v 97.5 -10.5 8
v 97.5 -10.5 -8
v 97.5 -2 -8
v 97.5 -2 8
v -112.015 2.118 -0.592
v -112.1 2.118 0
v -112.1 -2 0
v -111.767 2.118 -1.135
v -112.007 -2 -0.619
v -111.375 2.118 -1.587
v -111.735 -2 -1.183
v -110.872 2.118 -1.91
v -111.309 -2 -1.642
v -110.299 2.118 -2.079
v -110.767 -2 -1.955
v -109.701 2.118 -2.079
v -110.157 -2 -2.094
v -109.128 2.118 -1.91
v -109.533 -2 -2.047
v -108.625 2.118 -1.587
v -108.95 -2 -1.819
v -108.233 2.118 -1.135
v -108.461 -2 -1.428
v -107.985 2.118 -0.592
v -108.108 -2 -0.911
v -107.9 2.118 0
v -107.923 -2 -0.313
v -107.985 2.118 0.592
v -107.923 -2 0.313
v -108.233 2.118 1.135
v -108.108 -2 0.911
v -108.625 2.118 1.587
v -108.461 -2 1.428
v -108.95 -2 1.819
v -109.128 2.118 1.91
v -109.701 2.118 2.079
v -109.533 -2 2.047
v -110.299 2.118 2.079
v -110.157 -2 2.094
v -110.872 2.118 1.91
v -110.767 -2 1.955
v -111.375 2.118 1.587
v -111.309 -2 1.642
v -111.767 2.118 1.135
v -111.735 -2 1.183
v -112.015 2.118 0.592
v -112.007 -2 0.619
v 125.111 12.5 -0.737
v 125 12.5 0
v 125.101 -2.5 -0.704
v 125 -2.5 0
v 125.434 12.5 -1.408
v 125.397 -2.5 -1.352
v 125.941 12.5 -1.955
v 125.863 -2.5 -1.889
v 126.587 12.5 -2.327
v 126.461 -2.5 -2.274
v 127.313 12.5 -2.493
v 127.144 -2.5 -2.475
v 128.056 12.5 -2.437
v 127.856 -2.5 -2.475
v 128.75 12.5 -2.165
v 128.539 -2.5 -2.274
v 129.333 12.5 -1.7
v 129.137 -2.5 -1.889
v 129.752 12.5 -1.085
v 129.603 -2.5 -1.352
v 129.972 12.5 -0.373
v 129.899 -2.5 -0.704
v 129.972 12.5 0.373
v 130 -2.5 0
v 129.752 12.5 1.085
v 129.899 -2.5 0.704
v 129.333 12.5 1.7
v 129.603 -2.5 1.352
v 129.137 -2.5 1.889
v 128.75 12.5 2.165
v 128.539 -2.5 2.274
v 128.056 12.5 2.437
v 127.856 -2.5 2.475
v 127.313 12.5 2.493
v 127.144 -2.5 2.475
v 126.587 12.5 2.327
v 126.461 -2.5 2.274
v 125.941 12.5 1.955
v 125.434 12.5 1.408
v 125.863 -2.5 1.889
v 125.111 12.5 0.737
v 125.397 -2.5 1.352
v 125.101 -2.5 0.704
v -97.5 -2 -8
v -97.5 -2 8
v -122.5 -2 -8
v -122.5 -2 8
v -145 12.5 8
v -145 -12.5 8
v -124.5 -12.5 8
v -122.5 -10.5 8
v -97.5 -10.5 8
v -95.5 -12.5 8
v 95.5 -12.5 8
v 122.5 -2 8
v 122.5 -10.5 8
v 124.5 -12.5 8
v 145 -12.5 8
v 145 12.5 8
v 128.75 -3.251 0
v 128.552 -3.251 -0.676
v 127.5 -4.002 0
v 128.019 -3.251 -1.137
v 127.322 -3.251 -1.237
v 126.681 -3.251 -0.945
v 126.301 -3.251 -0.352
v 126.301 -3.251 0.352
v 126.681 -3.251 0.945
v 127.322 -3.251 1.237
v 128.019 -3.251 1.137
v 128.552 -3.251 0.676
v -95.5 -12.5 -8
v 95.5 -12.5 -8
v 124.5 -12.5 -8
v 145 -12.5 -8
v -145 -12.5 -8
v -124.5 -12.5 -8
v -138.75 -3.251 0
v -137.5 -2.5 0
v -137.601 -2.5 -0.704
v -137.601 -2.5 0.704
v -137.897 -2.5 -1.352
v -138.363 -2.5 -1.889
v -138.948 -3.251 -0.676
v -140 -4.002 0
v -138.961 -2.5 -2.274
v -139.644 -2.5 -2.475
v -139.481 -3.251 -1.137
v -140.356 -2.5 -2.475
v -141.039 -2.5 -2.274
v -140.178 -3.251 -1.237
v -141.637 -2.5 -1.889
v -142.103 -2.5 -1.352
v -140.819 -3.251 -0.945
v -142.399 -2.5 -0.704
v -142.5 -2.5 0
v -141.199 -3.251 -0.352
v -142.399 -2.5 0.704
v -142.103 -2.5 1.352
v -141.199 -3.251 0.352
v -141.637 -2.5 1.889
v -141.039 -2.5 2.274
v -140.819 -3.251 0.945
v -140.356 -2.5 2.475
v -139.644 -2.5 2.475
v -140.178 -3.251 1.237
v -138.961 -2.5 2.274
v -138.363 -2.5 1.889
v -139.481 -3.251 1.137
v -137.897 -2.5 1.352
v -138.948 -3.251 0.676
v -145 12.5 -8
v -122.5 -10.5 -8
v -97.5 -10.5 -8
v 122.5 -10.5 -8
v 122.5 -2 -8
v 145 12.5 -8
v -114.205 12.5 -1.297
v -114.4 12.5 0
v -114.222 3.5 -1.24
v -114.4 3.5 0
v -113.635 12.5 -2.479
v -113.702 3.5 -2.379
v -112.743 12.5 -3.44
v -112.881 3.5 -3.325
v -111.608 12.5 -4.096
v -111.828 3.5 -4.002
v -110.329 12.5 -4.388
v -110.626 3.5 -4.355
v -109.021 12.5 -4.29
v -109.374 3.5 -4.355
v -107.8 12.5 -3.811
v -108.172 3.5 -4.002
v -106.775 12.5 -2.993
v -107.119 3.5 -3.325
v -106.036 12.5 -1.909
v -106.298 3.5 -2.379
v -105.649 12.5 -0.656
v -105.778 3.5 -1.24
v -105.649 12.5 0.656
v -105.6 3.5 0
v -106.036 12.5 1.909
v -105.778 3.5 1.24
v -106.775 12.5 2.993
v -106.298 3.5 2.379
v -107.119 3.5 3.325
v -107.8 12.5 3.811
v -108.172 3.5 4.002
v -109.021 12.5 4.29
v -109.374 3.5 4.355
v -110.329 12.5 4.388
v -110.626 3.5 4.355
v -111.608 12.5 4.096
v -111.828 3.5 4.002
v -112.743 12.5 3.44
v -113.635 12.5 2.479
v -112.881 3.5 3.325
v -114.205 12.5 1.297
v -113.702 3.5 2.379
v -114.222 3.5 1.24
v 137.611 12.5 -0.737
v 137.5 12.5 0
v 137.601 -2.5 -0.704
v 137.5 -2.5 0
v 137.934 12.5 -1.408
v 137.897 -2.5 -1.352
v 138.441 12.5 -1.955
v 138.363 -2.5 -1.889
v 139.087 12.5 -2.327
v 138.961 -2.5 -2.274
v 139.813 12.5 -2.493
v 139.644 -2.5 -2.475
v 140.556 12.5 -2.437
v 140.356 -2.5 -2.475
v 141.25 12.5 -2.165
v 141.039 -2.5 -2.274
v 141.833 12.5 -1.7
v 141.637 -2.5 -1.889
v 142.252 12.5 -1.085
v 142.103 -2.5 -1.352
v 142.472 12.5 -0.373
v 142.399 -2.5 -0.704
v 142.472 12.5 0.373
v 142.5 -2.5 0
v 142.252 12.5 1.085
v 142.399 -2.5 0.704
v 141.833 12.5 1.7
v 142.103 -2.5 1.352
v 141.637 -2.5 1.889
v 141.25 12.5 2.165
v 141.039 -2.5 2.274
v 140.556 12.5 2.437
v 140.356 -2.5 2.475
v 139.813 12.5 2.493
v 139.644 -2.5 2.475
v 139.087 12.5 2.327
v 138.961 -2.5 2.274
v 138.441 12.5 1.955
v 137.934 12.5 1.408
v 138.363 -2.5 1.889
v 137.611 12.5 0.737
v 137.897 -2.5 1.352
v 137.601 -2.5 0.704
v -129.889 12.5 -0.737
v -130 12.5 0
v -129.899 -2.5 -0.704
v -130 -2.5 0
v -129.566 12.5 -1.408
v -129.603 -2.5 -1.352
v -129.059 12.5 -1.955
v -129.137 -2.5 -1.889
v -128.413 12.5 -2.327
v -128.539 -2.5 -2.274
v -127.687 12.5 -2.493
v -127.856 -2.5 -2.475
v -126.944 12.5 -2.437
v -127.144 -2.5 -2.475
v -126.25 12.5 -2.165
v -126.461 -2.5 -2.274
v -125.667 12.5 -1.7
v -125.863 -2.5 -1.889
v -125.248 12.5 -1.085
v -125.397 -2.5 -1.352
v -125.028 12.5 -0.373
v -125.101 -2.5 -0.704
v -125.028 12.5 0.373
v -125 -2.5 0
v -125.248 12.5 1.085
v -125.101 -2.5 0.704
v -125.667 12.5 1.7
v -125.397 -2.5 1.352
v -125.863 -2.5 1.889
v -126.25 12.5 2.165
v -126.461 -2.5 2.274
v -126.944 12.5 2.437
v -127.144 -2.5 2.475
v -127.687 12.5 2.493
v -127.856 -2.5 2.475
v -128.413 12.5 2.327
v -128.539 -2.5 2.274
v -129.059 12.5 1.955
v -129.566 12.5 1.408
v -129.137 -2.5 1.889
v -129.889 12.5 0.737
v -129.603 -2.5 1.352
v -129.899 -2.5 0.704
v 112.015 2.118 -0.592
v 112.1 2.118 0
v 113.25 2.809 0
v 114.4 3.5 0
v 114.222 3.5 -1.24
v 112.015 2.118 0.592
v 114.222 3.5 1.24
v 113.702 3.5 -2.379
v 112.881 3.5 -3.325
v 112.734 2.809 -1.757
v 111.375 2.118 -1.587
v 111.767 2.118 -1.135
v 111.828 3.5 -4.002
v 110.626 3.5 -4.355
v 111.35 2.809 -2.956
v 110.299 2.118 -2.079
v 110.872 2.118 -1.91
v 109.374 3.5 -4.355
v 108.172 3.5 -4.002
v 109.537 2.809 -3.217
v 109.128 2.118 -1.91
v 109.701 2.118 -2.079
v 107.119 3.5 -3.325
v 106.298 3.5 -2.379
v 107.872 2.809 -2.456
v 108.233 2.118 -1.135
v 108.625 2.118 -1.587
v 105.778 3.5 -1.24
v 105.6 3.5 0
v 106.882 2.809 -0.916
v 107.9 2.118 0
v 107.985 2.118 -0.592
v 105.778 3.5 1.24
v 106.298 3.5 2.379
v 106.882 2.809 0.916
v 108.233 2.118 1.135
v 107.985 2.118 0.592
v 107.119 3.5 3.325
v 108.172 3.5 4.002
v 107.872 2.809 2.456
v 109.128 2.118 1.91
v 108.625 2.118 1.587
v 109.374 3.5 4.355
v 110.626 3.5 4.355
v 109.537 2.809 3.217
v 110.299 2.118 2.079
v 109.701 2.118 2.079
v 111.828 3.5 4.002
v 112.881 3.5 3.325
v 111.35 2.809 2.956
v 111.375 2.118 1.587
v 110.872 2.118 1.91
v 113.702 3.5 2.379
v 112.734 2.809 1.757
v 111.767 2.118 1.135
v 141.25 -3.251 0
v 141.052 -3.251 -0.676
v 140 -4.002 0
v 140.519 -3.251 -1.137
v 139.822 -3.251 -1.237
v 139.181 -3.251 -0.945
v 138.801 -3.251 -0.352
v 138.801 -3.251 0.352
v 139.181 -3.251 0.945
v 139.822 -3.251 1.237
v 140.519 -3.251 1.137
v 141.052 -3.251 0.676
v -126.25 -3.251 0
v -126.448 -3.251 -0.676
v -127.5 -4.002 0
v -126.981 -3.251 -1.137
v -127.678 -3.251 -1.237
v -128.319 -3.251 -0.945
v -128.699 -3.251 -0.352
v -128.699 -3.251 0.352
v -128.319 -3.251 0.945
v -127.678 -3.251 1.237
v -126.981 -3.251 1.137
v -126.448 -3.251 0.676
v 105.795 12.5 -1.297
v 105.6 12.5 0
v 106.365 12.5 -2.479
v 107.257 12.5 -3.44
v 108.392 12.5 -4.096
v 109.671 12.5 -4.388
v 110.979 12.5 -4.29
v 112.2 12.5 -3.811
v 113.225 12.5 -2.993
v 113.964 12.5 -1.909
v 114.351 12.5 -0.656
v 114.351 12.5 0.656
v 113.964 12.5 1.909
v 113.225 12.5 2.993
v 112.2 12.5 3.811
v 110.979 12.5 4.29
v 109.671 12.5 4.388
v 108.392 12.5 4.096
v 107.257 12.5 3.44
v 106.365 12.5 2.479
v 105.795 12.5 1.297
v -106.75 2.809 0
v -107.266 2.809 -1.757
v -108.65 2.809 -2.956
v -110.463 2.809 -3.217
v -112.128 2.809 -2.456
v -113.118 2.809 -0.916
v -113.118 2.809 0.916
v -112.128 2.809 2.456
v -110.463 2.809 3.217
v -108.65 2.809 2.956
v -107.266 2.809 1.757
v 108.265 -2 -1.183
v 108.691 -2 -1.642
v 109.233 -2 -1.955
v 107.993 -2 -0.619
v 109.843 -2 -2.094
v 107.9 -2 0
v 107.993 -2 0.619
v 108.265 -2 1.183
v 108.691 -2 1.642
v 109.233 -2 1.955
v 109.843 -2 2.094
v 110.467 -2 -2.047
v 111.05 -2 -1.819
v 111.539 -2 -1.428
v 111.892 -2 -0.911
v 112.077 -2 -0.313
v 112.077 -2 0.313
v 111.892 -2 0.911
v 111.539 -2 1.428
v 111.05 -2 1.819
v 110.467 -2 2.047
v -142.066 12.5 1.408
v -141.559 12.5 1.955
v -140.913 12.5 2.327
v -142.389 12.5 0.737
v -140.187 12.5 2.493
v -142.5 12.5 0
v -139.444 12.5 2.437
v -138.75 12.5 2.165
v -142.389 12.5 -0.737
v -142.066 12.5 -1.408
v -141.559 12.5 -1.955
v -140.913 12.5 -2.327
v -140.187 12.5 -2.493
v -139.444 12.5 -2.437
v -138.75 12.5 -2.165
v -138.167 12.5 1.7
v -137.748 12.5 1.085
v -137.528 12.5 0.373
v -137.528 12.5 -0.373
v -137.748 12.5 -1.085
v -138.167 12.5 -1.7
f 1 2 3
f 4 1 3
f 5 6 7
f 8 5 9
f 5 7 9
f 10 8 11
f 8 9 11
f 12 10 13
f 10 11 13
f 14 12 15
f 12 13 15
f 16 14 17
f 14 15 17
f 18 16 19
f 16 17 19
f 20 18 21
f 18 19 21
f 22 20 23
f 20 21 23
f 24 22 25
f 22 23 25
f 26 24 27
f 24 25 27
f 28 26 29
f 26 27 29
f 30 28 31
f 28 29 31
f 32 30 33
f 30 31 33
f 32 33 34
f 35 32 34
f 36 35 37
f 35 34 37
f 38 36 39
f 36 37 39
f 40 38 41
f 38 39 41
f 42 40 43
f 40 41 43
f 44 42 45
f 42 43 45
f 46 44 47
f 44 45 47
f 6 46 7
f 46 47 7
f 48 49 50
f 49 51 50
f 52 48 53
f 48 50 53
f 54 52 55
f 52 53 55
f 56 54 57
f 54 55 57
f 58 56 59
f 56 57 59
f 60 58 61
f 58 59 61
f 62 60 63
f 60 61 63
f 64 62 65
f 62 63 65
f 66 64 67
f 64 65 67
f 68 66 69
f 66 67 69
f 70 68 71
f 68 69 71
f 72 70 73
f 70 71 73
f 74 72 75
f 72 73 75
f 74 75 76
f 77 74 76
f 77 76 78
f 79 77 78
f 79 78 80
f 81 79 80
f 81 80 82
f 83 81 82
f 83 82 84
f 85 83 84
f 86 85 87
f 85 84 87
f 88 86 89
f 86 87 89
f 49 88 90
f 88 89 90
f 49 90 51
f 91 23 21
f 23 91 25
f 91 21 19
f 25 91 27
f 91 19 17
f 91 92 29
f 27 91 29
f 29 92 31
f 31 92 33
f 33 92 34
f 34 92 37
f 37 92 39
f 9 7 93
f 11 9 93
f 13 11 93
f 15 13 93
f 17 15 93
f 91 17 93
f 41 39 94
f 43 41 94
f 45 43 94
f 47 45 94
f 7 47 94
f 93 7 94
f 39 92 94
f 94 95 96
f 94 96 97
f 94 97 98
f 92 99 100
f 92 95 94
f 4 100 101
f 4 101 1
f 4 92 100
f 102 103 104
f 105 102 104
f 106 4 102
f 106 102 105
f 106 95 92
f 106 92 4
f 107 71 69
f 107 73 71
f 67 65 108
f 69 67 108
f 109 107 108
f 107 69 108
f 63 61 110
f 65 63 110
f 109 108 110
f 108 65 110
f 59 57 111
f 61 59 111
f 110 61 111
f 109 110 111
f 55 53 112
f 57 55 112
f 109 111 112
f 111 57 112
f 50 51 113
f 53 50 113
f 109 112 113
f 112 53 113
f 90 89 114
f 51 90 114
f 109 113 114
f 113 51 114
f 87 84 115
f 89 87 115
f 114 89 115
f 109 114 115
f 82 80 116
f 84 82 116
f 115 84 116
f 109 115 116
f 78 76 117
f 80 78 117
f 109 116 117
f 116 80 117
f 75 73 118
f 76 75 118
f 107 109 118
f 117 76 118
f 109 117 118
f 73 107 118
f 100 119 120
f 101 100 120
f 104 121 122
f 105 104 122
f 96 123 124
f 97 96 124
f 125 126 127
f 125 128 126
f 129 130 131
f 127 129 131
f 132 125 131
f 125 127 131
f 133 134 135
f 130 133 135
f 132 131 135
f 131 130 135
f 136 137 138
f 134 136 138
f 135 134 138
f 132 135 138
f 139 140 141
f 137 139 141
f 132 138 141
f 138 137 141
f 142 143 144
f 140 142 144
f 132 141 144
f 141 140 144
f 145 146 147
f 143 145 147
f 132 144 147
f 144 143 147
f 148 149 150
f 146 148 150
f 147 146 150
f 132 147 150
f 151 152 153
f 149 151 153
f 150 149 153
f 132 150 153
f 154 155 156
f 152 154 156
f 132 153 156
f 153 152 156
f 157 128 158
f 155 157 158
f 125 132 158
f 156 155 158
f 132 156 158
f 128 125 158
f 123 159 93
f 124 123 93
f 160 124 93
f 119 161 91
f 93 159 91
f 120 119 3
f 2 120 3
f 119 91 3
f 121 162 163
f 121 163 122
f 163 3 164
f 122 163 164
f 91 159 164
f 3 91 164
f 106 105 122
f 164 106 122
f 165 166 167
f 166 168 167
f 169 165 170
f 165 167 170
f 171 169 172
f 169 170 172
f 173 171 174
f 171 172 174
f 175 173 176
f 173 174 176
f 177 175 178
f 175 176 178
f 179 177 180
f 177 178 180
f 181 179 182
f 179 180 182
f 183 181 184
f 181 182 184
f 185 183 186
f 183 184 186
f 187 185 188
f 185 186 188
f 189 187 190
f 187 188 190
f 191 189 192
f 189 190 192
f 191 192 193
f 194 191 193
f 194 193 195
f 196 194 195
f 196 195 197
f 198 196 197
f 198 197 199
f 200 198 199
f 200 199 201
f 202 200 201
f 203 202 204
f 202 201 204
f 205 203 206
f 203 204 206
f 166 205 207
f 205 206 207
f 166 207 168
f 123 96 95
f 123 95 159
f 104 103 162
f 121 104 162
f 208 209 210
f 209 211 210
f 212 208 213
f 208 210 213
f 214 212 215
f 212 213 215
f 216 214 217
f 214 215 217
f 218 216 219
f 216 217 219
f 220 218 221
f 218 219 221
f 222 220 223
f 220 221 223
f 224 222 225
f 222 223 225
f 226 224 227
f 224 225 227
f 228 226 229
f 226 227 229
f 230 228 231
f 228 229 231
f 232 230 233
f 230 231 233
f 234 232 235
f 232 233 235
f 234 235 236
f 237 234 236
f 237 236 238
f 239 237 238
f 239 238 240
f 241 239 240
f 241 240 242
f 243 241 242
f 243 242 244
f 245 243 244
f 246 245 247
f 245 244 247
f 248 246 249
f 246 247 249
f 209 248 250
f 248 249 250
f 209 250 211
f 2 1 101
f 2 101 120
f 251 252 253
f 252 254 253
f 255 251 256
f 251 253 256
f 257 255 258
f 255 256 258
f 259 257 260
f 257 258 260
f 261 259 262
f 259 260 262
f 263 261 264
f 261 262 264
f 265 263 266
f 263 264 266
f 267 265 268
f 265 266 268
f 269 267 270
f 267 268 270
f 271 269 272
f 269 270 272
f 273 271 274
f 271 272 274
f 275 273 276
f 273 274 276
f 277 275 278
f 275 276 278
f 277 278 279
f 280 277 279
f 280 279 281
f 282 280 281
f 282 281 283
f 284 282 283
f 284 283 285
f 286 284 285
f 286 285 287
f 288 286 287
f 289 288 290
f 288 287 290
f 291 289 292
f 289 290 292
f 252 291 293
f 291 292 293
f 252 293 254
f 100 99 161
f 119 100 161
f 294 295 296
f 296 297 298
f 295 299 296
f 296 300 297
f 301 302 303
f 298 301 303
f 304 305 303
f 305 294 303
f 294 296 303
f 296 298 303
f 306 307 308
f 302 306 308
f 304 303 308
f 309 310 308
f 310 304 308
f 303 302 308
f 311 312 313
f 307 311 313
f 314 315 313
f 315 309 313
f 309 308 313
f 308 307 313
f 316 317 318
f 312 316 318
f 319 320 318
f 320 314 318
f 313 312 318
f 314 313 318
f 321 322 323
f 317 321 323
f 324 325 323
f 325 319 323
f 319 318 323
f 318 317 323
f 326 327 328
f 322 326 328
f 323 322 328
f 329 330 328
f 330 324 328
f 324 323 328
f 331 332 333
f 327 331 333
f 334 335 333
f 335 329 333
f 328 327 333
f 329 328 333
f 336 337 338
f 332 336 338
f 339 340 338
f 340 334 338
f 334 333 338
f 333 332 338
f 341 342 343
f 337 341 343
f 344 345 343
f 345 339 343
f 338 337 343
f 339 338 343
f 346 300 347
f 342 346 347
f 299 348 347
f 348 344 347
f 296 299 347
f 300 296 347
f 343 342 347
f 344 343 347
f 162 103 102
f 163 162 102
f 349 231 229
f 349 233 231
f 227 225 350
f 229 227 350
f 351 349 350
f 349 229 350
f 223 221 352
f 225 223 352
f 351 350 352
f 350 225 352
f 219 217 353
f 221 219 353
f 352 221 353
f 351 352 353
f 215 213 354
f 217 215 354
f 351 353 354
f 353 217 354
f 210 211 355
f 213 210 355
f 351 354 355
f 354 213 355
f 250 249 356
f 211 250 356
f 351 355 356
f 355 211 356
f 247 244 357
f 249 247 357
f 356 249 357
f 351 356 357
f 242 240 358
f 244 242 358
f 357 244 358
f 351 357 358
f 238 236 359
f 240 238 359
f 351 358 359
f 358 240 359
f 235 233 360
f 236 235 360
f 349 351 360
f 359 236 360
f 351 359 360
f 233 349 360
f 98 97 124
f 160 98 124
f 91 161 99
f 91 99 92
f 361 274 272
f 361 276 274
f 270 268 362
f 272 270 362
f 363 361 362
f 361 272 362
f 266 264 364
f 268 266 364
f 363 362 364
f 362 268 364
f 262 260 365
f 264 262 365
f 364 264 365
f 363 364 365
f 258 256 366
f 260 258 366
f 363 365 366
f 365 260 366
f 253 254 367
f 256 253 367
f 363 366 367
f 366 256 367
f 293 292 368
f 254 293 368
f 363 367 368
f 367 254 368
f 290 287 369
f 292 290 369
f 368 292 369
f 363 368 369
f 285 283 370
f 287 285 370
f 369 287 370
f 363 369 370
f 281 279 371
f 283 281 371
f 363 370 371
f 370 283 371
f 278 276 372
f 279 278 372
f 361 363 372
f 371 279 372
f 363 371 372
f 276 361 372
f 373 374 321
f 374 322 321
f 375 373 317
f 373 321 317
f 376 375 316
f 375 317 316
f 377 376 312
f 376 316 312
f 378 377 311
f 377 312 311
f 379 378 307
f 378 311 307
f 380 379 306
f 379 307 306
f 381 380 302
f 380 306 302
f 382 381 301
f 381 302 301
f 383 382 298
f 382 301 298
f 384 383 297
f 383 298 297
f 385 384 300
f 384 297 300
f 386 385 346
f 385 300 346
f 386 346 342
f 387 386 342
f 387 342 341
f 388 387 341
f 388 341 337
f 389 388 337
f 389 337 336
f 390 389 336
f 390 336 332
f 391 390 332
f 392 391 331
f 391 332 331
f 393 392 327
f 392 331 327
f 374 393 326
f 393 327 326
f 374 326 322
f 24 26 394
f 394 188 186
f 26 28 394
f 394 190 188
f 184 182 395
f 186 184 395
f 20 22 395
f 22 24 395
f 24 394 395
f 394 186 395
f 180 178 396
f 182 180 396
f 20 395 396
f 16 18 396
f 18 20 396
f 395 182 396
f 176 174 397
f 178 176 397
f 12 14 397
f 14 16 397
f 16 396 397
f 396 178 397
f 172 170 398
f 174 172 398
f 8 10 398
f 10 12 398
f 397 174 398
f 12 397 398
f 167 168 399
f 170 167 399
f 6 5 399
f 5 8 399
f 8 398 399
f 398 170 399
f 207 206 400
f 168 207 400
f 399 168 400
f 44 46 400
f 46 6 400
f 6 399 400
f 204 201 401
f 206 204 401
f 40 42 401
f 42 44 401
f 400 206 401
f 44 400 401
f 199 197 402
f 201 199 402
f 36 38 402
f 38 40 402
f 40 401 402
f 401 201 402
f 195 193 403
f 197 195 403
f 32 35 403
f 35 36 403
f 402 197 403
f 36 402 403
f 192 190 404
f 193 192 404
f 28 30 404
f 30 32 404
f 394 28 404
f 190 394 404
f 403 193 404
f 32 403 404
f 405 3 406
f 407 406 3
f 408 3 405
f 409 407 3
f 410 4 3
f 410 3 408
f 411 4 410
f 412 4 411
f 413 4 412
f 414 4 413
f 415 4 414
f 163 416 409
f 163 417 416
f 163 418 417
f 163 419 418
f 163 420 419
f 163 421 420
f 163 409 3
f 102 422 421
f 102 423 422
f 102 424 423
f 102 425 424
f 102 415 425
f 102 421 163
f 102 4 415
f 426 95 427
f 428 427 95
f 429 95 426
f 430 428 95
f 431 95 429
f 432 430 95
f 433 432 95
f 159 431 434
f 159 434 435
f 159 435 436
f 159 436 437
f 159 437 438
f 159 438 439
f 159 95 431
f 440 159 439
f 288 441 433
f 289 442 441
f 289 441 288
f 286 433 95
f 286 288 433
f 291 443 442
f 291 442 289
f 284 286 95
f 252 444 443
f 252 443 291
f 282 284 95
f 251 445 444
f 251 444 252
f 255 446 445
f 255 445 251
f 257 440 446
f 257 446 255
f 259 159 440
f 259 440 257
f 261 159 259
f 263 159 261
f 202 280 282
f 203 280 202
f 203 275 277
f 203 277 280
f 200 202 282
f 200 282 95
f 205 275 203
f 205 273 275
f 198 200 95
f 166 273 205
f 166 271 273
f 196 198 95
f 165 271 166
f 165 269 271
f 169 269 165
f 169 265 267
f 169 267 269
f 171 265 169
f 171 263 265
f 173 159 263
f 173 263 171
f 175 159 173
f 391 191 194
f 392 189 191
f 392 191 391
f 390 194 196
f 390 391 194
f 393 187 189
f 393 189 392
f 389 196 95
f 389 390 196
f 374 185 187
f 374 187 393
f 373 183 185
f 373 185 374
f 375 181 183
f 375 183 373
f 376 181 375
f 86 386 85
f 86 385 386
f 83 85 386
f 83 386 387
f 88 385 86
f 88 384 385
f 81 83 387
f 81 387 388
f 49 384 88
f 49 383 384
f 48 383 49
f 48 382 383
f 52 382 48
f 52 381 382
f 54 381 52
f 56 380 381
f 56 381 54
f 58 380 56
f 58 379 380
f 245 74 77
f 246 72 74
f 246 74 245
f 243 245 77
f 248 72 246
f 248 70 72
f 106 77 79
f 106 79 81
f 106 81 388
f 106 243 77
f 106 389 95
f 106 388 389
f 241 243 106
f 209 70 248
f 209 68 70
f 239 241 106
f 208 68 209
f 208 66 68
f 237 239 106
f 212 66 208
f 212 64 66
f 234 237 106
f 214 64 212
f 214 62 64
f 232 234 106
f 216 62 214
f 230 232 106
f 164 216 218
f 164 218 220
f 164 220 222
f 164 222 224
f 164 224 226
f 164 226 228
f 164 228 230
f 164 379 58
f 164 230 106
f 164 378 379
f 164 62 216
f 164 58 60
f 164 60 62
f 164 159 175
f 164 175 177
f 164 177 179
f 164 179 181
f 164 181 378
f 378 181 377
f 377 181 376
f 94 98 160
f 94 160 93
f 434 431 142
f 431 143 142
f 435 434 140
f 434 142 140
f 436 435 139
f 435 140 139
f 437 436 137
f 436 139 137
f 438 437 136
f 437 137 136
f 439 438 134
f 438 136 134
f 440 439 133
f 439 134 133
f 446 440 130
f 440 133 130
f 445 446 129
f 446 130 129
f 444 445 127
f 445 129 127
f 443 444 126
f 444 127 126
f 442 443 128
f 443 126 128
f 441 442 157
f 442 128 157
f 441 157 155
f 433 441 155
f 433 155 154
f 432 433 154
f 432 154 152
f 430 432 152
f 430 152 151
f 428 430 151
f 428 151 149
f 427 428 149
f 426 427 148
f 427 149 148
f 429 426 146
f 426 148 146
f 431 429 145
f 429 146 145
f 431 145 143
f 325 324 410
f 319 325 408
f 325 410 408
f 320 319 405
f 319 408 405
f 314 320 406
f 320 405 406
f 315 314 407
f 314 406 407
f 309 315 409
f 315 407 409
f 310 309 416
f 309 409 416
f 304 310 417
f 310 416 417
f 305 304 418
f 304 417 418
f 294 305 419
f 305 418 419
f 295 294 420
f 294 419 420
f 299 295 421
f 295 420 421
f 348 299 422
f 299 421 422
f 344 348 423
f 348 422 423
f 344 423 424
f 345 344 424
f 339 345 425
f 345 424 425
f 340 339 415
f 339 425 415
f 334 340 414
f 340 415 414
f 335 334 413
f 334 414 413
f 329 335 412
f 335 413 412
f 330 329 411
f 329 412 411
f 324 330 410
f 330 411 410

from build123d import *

# Parameters (mm, degrees)
SKETCH1_W                = 290
SKETCH1_H                = 16
BOSS_EXTRUDE1_DEPTH      = 12.5
M5_TAPPED_HOLE1_D        = 4.2
SKETCH7_W                = 25
SKETCH7_H                = 24.547818694
CUT_EXTRUDE2_DEPTH       = 147.414650906
CHAMFER1_SIZE            = 2
CHAMFER1_OF_MIRROR1_SIZE = 2
G1_8_TAPPED_HOLE1_D      = 8.8
G1_8_TAPPED_HOLE1_DEPTH  = 9
G1_8_TAPPED_HOLE1_TIP    = 2.643786724
M6_TAPPED_HOLE1_D        = 5
M6_TAPPED_HOLE1_DEPTH    = 15
M6_TAPPED_HOLE1_TIP      = 1.502151548


with BuildPart() as part:
    # Sketch1 → Boss-Extrude1 (new, symmetric)
    with BuildSketch(Plane(origin=(0, 0, 0), x_dir=(1, 0, 0), z_dir=(0, 1, 0))):
        Rectangle(SKETCH1_W, SKETCH1_H)
    extrude(amount=BOSS_EXTRUDE1_DEPTH, both=True)

    # M5 Tapped Hole1 (through all)
    with Locations(Plane(origin=(0, 12.5, 0), x_dir=(1, 0, 0), z_dir=(0, 1, 0))):
        with Locations((-110, 0), (110, 0)):
            Hole(M5_TAPPED_HOLE1_D / 2)

    # Sketch7 → Cut-Extrude2 (cut, through all)
    with BuildSketch(Plane.XY.offset(8)):
        with Locations((110, -14.273909347)):
            Rectangle(SKETCH7_W, SKETCH7_H)
    cut_extrude2 = extrude(amount=-CUT_EXTRUDE2_DEPTH, mode=Mode.SUBTRACT)

    # Chamfer1
    chamfer1_edges = [part.edges().sort_by_distance(p)[0] for p in [
        (122.5, -12.5, 0),
        (97.5, -12.5, 0),
    ]]
    chamfer(chamfer1_edges, length=CHAMFER1_SIZE)

    # Mirror1: Cut-Extrude2 across plane
    add(cut_extrude2.mirror(Plane(origin=(0, 0, 0), x_dir=(0, 0, 1), z_dir=(1, 0, 0))), mode=Mode.SUBTRACT)

    # Chamfer1 of Mirror1
    chamfer1_of_mirror1_edges = [part.edges().sort_by_distance(p)[0] for p in [
        (-122.5, -12.5, 0),
        (-97.5, -12.5, 0),
    ]]
    chamfer(chamfer1_of_mirror1_edges, length=CHAMFER1_OF_MIRROR1_SIZE)

    # G1/8 Tapped Hole1
    with Locations(Plane(origin=(0, 12.5, 0), x_dir=(1, 0, 0), z_dir=(0, 1, 0))):
        with Locations((-110, 0), (110, 0)):
            Hole(G1_8_TAPPED_HOLE1_D / 2, depth=G1_8_TAPPED_HOLE1_DEPTH)
            with Locations((0, 0, -(G1_8_TAPPED_HOLE1_DEPTH + G1_8_TAPPED_HOLE1_TIP / 2))):  # 118° drill point
                Cone(0, G1_8_TAPPED_HOLE1_D / 2, G1_8_TAPPED_HOLE1_TIP, mode=Mode.SUBTRACT)

    # M6 Tapped Hole1
    with Locations(Plane(origin=(0, 12.5, 0), x_dir=(1, 0, 0), z_dir=(0, 1, 0))):
        with Locations((-140, 0), (-127.5, 0), (127.5, 0), (140, 0)):
            Hole(M6_TAPPED_HOLE1_D / 2, depth=M6_TAPPED_HOLE1_DEPTH)
            with Locations((0, 0, -(M6_TAPPED_HOLE1_DEPTH + M6_TAPPED_HOLE1_TIP / 2))):  # 118° drill point
                Cone(0, M6_TAPPED_HOLE1_D / 2, M6_TAPPED_HOLE1_TIP, mode=Mode.SUBTRACT)


solid = part.part
